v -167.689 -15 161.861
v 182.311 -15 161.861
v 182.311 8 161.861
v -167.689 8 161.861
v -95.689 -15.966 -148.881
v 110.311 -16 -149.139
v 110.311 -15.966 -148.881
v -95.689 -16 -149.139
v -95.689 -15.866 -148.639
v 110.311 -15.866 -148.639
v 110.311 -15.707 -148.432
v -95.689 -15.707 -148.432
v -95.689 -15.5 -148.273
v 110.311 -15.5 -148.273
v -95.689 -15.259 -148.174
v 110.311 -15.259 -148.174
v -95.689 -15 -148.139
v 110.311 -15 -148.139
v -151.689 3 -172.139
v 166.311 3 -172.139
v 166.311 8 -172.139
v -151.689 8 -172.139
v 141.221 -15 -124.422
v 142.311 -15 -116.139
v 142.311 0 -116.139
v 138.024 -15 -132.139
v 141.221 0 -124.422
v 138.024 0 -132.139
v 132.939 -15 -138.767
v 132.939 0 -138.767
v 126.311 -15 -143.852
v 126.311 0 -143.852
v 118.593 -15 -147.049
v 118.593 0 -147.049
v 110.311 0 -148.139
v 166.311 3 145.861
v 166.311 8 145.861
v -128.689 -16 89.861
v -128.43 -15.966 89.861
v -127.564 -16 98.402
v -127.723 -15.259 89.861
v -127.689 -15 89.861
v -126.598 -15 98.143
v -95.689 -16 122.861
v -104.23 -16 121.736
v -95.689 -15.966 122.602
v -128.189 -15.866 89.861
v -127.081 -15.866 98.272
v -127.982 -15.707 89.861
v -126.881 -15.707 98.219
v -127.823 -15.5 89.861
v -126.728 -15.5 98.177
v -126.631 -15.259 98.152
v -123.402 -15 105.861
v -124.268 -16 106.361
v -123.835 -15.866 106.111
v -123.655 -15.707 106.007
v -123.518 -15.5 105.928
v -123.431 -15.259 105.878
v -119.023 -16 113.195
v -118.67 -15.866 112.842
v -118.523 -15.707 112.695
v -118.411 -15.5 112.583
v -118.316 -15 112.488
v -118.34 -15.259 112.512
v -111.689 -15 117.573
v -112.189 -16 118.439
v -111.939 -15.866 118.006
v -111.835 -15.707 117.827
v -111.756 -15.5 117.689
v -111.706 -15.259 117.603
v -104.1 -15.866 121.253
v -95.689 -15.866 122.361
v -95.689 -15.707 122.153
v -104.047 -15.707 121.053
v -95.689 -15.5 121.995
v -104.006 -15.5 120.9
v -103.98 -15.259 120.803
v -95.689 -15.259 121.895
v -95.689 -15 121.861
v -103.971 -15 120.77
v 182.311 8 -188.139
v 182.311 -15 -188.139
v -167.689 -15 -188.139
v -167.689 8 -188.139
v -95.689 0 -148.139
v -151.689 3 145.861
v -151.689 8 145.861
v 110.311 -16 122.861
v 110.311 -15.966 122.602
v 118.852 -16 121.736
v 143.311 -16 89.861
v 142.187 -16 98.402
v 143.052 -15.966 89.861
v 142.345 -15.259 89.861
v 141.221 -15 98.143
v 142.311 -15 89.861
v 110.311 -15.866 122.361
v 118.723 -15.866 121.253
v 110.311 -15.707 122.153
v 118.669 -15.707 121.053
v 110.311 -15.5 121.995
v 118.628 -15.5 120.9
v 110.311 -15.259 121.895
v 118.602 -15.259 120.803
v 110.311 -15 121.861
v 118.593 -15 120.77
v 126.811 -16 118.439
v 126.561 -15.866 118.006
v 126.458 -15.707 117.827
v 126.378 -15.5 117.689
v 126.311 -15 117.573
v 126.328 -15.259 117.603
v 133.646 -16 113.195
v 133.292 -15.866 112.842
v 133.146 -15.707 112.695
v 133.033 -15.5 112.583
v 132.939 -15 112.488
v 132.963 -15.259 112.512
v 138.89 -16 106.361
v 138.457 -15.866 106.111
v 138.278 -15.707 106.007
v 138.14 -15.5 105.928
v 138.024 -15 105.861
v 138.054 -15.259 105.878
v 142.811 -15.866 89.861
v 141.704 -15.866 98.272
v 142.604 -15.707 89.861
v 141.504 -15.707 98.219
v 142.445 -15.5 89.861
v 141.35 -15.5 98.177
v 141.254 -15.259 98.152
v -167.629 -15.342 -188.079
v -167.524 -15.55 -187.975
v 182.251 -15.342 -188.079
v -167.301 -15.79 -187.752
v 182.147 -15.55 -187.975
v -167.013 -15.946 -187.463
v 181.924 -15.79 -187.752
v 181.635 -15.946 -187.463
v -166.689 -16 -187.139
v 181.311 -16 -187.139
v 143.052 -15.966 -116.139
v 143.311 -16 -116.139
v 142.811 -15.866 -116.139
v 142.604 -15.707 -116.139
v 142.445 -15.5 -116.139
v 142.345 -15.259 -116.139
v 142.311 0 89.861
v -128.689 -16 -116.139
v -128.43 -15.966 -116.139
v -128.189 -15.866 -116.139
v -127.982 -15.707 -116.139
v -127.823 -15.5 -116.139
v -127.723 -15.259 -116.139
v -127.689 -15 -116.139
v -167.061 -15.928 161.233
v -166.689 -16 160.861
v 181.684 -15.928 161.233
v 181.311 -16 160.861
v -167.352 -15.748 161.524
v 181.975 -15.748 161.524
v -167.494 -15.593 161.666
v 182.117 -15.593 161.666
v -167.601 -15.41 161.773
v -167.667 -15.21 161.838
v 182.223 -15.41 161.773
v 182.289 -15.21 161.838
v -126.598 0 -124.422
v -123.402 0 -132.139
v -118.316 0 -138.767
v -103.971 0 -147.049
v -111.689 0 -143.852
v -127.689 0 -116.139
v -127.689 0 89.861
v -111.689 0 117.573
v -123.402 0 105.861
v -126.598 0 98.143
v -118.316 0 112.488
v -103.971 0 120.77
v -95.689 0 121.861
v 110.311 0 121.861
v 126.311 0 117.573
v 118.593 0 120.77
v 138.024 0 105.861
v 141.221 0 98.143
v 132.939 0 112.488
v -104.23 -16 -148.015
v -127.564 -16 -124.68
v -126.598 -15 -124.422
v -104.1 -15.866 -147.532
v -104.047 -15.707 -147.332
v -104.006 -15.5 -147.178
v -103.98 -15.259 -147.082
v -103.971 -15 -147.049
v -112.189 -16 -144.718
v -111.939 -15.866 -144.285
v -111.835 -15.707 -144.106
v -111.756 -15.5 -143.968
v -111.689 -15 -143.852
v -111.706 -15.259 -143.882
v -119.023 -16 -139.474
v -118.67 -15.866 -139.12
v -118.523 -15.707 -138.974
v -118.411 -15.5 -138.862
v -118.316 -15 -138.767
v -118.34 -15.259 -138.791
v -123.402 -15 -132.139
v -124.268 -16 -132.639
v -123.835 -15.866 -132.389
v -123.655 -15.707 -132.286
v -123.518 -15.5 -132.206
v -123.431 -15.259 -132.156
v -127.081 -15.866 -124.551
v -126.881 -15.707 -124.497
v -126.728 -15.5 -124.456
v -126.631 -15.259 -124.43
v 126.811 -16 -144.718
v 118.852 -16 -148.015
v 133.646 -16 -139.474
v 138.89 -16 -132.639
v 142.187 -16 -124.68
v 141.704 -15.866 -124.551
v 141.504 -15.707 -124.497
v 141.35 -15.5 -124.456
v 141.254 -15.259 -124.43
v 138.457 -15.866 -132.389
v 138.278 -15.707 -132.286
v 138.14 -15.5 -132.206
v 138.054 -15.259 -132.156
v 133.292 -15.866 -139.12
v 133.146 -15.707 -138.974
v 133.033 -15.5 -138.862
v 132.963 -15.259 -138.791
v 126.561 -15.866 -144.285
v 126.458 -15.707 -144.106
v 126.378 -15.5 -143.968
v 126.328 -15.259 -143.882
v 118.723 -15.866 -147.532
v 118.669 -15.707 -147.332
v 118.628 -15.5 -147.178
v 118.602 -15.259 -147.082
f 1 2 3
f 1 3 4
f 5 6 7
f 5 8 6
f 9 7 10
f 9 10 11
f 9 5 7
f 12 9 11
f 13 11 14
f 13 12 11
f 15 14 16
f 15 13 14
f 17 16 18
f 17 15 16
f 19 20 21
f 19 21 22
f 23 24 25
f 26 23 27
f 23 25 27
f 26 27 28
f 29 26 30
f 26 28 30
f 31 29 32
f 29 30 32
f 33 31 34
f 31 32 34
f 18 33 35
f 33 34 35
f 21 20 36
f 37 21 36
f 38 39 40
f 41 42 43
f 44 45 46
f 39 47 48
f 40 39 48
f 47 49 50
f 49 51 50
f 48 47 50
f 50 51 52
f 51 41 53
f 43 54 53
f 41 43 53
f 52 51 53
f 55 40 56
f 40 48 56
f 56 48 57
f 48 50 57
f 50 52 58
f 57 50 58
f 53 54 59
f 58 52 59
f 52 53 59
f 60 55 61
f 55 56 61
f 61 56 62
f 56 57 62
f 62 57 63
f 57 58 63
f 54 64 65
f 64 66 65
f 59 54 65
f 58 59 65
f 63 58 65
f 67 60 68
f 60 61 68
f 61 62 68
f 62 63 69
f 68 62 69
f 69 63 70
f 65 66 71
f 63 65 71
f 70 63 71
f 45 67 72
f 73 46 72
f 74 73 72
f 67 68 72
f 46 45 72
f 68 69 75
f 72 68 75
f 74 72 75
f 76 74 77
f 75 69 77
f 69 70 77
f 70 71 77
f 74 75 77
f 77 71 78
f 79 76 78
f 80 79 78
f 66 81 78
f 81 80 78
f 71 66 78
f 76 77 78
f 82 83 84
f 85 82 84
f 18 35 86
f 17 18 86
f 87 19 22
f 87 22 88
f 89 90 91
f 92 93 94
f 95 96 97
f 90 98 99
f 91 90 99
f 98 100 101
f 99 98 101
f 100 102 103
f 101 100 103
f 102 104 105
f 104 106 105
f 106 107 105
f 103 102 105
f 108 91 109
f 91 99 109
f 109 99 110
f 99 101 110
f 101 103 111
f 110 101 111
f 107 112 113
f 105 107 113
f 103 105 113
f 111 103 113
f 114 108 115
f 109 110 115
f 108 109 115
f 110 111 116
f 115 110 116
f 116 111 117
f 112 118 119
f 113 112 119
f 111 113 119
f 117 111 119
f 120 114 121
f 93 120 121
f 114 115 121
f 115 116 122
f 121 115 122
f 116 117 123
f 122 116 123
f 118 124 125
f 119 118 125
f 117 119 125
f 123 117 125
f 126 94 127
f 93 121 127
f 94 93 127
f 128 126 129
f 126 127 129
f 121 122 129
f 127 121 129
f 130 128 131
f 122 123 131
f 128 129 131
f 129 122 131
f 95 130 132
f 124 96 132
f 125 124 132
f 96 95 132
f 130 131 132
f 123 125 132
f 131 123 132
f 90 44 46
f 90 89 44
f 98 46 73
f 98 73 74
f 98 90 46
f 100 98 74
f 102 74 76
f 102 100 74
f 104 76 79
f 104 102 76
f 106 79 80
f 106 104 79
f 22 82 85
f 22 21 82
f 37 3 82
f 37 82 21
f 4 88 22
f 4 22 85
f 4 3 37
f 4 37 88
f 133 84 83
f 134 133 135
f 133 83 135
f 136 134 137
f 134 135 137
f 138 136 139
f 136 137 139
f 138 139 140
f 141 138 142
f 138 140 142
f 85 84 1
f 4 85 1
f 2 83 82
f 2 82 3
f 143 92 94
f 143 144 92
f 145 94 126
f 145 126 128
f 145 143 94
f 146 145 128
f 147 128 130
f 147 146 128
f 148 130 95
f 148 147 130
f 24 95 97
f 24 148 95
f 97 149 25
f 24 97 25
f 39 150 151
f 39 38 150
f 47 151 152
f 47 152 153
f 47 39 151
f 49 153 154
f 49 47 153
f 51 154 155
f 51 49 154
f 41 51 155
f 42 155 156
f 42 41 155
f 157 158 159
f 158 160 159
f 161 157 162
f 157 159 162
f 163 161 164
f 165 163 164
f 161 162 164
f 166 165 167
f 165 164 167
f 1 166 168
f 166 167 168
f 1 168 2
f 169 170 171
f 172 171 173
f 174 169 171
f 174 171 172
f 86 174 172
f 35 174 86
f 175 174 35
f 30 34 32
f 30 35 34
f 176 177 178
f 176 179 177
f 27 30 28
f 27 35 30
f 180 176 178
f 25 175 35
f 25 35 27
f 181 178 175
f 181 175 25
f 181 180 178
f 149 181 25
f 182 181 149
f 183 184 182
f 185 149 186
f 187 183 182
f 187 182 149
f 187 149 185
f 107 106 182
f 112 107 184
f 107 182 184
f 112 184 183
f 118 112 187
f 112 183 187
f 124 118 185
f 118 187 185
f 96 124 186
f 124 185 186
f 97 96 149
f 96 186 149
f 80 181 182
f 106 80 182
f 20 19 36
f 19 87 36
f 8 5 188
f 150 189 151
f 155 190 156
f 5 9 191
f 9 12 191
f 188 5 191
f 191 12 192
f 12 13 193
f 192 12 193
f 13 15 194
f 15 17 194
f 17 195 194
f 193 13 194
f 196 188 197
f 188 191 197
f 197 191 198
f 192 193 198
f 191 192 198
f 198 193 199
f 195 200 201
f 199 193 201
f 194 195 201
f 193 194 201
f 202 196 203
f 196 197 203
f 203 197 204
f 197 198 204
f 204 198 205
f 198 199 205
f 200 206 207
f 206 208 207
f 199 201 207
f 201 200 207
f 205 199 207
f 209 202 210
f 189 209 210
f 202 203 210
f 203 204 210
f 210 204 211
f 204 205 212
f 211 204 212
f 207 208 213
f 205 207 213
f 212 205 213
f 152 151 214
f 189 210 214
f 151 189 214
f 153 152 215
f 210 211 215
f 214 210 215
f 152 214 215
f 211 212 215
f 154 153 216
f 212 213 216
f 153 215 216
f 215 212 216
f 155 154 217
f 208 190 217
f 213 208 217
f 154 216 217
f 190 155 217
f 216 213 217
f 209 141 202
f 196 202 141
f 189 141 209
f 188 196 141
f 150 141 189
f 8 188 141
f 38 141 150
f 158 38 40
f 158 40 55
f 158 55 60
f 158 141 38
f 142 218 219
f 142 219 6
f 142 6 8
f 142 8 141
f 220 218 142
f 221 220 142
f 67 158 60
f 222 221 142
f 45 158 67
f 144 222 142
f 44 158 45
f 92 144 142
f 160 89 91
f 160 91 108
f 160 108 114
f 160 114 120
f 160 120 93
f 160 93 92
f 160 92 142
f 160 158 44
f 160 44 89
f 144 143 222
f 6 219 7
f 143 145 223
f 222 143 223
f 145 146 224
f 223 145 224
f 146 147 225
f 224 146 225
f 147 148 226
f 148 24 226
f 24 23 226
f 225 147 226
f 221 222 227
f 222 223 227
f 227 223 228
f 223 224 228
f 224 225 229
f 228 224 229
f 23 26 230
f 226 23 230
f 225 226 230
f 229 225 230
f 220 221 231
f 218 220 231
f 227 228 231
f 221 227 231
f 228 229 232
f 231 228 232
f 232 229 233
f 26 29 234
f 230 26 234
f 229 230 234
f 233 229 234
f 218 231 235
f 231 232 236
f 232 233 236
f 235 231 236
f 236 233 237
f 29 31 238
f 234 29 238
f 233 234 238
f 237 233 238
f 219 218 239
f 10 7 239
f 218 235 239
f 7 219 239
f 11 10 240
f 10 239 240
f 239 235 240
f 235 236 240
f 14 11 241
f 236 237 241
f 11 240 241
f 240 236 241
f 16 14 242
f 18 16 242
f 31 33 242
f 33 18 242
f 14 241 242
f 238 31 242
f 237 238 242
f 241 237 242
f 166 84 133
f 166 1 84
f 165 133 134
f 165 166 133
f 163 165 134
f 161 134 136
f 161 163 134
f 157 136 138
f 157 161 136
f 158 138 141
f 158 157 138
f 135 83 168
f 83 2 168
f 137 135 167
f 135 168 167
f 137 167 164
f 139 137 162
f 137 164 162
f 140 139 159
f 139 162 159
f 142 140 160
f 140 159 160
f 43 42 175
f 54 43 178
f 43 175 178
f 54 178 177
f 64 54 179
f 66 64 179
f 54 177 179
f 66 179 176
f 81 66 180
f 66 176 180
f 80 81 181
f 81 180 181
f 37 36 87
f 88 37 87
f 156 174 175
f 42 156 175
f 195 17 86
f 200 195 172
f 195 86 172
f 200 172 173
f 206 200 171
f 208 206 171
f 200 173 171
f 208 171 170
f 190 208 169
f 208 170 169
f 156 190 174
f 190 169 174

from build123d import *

# Parameters (mm, degrees)
F0_W     = 350
F0_H     = 350
F1_DEPTH = 16
F2_DEPTH = 3
F3_W     = 350
F3_H     = 350
F3_W_2   = 318
F3_H_2   = 318
F4_DEPTH = 5
F5_R     = 1


with BuildPart() as f1:
    # F0 (on Front) → F1 (new body)
    with BuildSketch(Plane.XZ):
        with Locations((7.3111886159, -13.1394357215)):
            Rectangle(F0_W, F0_H)
        with BuildLine():
            ThreePointArc((-127.6888113841, 89.8605642785), (-118.3162283821, 112.4879812765), (-95.6888113841, 121.8605642785))
            Line((-95.6888113841, 121.8605642785), (110.3111886159, 121.8605642785))
            ThreePointArc((110.3111886159, 121.8605642785), (132.9386056138, 112.4879812765), (142.3111886159, 89.8605642785))
            Line((142.3111886159, 89.8605642785), (142.3111886159, -116.1394357215))
            ThreePointArc((142.3111886159, -116.1394357215), (132.9386056138, -138.7668527195), (110.3111886159, -148.1394357215))
            Line((110.3111886159, -148.1394357215), (-95.6888113841, -148.1394357215))
            ThreePointArc((-95.6888113841, -148.1394357215), (-118.3162283821, -138.7668527195), (-127.6888113841, -116.1394357215))
            Line((-127.6888113841, -116.1394357215), (-127.6888113841, 89.8605642785))
        make_face(mode=Mode.SUBTRACT)
    extrude(amount=F1_DEPTH)

    # F0 (on Front) → F2 (join)
    with BuildSketch(Plane.XZ):
        with Locations((7.3111886159, -13.1394357215)):
            Rectangle(F0_W, F0_H)
        with BuildLine():
            ThreePointArc((-127.6888113841, 89.8605642785), (-118.3162283821, 112.4879812765), (-95.6888113841, 121.8605642785))
            Line((-95.6888113841, 121.8605642785), (110.3111886159, 121.8605642785))
            ThreePointArc((110.3111886159, 121.8605642785), (132.9386056138, 112.4879812765), (142.3111886159, 89.8605642785))
            Line((142.3111886159, 89.8605642785), (142.3111886159, -116.1394357215))
            ThreePointArc((142.3111886159, -116.1394357215), (132.9386056138, -138.7668527195), (110.3111886159, -148.1394357215))
            Line((110.3111886159, -148.1394357215), (-95.6888113841, -148.1394357215))
            ThreePointArc((-95.6888113841, -148.1394357215), (-118.3162283821, -138.7668527195), (-127.6888113841, -116.1394357215))
            Line((-127.6888113841, -116.1394357215), (-127.6888113841, 89.8605642785))
        make_face(mode=Mode.SUBTRACT)
        with BuildLine():
            Line((110.3111886159, 121.8605642785), (-95.6888113841, 121.8605642785))
            ThreePointArc((-95.6888113841, 121.8605642785), (-118.3162283821, 112.4879812765), (-127.6888113841, 89.8605642785))
            Line((-127.6888113841, 89.8605642785), (-127.6888113841, -116.1394357215))
            ThreePointArc((-127.6888113841, -116.1394357215), (-118.3162283821, -138.7668527195), (-95.6888113841, -148.1394357215))
            Line((-95.6888113841, -148.1394357215), (110.3111886159, -148.1394357215))
            ThreePointArc((110.3111886159, -148.1394357215), (132.9386056138, -138.7668527195), (142.3111886159, -116.1394357215))
            Line((142.3111886159, -116.1394357215), (142.3111886159, 89.8605642785))
            ThreePointArc((142.3111886159, 89.8605642785), (132.9386056138, 112.4879812765), (110.3111886159, 121.8605642785))
        make_face()
    extrude(amount=-F2_DEPTH)

    # F3 (on face) → F4 (join)
    with BuildSketch(Plane(origin=(0, 3, 0), x_dir=(-1, 0, 0), z_dir=(0, 1, 0))):
        with Locations((-7.3111886159, -13.1394357215)):
            Rectangle(F3_W, F3_H)
        with Locations((-7.3111886159, -13.1394357215)):
            Rectangle(F3_W_2, F3_H_2, mode=Mode.SUBTRACT)
    extrude(amount=F4_DEPTH)

    # F5
    f5_edges = [f1.edges().sort_by_distance(p)[0] for p in [
        (7.311189, -16, 161.860564),
        (-167.688811, -16, -13.139436),
        (7.311189, -16, -188.139436),
        (182.311189, -16, -13.139436),
        (-118.316228, -16, 112.487981),
        (7.311189, -16, 121.860564),
        (132.938606, -16, 112.487981),
        (142.311189, -16, -13.139436),
        (132.938606, -16, -138.766853),
        (7.311189, -16, -148.139436),
        (-118.316228, -16, -138.766853),
        (-127.688811, -16, -13.139436),
    ]]
    fillet(f5_edges, radius=F5_R)


solid = f1.part
